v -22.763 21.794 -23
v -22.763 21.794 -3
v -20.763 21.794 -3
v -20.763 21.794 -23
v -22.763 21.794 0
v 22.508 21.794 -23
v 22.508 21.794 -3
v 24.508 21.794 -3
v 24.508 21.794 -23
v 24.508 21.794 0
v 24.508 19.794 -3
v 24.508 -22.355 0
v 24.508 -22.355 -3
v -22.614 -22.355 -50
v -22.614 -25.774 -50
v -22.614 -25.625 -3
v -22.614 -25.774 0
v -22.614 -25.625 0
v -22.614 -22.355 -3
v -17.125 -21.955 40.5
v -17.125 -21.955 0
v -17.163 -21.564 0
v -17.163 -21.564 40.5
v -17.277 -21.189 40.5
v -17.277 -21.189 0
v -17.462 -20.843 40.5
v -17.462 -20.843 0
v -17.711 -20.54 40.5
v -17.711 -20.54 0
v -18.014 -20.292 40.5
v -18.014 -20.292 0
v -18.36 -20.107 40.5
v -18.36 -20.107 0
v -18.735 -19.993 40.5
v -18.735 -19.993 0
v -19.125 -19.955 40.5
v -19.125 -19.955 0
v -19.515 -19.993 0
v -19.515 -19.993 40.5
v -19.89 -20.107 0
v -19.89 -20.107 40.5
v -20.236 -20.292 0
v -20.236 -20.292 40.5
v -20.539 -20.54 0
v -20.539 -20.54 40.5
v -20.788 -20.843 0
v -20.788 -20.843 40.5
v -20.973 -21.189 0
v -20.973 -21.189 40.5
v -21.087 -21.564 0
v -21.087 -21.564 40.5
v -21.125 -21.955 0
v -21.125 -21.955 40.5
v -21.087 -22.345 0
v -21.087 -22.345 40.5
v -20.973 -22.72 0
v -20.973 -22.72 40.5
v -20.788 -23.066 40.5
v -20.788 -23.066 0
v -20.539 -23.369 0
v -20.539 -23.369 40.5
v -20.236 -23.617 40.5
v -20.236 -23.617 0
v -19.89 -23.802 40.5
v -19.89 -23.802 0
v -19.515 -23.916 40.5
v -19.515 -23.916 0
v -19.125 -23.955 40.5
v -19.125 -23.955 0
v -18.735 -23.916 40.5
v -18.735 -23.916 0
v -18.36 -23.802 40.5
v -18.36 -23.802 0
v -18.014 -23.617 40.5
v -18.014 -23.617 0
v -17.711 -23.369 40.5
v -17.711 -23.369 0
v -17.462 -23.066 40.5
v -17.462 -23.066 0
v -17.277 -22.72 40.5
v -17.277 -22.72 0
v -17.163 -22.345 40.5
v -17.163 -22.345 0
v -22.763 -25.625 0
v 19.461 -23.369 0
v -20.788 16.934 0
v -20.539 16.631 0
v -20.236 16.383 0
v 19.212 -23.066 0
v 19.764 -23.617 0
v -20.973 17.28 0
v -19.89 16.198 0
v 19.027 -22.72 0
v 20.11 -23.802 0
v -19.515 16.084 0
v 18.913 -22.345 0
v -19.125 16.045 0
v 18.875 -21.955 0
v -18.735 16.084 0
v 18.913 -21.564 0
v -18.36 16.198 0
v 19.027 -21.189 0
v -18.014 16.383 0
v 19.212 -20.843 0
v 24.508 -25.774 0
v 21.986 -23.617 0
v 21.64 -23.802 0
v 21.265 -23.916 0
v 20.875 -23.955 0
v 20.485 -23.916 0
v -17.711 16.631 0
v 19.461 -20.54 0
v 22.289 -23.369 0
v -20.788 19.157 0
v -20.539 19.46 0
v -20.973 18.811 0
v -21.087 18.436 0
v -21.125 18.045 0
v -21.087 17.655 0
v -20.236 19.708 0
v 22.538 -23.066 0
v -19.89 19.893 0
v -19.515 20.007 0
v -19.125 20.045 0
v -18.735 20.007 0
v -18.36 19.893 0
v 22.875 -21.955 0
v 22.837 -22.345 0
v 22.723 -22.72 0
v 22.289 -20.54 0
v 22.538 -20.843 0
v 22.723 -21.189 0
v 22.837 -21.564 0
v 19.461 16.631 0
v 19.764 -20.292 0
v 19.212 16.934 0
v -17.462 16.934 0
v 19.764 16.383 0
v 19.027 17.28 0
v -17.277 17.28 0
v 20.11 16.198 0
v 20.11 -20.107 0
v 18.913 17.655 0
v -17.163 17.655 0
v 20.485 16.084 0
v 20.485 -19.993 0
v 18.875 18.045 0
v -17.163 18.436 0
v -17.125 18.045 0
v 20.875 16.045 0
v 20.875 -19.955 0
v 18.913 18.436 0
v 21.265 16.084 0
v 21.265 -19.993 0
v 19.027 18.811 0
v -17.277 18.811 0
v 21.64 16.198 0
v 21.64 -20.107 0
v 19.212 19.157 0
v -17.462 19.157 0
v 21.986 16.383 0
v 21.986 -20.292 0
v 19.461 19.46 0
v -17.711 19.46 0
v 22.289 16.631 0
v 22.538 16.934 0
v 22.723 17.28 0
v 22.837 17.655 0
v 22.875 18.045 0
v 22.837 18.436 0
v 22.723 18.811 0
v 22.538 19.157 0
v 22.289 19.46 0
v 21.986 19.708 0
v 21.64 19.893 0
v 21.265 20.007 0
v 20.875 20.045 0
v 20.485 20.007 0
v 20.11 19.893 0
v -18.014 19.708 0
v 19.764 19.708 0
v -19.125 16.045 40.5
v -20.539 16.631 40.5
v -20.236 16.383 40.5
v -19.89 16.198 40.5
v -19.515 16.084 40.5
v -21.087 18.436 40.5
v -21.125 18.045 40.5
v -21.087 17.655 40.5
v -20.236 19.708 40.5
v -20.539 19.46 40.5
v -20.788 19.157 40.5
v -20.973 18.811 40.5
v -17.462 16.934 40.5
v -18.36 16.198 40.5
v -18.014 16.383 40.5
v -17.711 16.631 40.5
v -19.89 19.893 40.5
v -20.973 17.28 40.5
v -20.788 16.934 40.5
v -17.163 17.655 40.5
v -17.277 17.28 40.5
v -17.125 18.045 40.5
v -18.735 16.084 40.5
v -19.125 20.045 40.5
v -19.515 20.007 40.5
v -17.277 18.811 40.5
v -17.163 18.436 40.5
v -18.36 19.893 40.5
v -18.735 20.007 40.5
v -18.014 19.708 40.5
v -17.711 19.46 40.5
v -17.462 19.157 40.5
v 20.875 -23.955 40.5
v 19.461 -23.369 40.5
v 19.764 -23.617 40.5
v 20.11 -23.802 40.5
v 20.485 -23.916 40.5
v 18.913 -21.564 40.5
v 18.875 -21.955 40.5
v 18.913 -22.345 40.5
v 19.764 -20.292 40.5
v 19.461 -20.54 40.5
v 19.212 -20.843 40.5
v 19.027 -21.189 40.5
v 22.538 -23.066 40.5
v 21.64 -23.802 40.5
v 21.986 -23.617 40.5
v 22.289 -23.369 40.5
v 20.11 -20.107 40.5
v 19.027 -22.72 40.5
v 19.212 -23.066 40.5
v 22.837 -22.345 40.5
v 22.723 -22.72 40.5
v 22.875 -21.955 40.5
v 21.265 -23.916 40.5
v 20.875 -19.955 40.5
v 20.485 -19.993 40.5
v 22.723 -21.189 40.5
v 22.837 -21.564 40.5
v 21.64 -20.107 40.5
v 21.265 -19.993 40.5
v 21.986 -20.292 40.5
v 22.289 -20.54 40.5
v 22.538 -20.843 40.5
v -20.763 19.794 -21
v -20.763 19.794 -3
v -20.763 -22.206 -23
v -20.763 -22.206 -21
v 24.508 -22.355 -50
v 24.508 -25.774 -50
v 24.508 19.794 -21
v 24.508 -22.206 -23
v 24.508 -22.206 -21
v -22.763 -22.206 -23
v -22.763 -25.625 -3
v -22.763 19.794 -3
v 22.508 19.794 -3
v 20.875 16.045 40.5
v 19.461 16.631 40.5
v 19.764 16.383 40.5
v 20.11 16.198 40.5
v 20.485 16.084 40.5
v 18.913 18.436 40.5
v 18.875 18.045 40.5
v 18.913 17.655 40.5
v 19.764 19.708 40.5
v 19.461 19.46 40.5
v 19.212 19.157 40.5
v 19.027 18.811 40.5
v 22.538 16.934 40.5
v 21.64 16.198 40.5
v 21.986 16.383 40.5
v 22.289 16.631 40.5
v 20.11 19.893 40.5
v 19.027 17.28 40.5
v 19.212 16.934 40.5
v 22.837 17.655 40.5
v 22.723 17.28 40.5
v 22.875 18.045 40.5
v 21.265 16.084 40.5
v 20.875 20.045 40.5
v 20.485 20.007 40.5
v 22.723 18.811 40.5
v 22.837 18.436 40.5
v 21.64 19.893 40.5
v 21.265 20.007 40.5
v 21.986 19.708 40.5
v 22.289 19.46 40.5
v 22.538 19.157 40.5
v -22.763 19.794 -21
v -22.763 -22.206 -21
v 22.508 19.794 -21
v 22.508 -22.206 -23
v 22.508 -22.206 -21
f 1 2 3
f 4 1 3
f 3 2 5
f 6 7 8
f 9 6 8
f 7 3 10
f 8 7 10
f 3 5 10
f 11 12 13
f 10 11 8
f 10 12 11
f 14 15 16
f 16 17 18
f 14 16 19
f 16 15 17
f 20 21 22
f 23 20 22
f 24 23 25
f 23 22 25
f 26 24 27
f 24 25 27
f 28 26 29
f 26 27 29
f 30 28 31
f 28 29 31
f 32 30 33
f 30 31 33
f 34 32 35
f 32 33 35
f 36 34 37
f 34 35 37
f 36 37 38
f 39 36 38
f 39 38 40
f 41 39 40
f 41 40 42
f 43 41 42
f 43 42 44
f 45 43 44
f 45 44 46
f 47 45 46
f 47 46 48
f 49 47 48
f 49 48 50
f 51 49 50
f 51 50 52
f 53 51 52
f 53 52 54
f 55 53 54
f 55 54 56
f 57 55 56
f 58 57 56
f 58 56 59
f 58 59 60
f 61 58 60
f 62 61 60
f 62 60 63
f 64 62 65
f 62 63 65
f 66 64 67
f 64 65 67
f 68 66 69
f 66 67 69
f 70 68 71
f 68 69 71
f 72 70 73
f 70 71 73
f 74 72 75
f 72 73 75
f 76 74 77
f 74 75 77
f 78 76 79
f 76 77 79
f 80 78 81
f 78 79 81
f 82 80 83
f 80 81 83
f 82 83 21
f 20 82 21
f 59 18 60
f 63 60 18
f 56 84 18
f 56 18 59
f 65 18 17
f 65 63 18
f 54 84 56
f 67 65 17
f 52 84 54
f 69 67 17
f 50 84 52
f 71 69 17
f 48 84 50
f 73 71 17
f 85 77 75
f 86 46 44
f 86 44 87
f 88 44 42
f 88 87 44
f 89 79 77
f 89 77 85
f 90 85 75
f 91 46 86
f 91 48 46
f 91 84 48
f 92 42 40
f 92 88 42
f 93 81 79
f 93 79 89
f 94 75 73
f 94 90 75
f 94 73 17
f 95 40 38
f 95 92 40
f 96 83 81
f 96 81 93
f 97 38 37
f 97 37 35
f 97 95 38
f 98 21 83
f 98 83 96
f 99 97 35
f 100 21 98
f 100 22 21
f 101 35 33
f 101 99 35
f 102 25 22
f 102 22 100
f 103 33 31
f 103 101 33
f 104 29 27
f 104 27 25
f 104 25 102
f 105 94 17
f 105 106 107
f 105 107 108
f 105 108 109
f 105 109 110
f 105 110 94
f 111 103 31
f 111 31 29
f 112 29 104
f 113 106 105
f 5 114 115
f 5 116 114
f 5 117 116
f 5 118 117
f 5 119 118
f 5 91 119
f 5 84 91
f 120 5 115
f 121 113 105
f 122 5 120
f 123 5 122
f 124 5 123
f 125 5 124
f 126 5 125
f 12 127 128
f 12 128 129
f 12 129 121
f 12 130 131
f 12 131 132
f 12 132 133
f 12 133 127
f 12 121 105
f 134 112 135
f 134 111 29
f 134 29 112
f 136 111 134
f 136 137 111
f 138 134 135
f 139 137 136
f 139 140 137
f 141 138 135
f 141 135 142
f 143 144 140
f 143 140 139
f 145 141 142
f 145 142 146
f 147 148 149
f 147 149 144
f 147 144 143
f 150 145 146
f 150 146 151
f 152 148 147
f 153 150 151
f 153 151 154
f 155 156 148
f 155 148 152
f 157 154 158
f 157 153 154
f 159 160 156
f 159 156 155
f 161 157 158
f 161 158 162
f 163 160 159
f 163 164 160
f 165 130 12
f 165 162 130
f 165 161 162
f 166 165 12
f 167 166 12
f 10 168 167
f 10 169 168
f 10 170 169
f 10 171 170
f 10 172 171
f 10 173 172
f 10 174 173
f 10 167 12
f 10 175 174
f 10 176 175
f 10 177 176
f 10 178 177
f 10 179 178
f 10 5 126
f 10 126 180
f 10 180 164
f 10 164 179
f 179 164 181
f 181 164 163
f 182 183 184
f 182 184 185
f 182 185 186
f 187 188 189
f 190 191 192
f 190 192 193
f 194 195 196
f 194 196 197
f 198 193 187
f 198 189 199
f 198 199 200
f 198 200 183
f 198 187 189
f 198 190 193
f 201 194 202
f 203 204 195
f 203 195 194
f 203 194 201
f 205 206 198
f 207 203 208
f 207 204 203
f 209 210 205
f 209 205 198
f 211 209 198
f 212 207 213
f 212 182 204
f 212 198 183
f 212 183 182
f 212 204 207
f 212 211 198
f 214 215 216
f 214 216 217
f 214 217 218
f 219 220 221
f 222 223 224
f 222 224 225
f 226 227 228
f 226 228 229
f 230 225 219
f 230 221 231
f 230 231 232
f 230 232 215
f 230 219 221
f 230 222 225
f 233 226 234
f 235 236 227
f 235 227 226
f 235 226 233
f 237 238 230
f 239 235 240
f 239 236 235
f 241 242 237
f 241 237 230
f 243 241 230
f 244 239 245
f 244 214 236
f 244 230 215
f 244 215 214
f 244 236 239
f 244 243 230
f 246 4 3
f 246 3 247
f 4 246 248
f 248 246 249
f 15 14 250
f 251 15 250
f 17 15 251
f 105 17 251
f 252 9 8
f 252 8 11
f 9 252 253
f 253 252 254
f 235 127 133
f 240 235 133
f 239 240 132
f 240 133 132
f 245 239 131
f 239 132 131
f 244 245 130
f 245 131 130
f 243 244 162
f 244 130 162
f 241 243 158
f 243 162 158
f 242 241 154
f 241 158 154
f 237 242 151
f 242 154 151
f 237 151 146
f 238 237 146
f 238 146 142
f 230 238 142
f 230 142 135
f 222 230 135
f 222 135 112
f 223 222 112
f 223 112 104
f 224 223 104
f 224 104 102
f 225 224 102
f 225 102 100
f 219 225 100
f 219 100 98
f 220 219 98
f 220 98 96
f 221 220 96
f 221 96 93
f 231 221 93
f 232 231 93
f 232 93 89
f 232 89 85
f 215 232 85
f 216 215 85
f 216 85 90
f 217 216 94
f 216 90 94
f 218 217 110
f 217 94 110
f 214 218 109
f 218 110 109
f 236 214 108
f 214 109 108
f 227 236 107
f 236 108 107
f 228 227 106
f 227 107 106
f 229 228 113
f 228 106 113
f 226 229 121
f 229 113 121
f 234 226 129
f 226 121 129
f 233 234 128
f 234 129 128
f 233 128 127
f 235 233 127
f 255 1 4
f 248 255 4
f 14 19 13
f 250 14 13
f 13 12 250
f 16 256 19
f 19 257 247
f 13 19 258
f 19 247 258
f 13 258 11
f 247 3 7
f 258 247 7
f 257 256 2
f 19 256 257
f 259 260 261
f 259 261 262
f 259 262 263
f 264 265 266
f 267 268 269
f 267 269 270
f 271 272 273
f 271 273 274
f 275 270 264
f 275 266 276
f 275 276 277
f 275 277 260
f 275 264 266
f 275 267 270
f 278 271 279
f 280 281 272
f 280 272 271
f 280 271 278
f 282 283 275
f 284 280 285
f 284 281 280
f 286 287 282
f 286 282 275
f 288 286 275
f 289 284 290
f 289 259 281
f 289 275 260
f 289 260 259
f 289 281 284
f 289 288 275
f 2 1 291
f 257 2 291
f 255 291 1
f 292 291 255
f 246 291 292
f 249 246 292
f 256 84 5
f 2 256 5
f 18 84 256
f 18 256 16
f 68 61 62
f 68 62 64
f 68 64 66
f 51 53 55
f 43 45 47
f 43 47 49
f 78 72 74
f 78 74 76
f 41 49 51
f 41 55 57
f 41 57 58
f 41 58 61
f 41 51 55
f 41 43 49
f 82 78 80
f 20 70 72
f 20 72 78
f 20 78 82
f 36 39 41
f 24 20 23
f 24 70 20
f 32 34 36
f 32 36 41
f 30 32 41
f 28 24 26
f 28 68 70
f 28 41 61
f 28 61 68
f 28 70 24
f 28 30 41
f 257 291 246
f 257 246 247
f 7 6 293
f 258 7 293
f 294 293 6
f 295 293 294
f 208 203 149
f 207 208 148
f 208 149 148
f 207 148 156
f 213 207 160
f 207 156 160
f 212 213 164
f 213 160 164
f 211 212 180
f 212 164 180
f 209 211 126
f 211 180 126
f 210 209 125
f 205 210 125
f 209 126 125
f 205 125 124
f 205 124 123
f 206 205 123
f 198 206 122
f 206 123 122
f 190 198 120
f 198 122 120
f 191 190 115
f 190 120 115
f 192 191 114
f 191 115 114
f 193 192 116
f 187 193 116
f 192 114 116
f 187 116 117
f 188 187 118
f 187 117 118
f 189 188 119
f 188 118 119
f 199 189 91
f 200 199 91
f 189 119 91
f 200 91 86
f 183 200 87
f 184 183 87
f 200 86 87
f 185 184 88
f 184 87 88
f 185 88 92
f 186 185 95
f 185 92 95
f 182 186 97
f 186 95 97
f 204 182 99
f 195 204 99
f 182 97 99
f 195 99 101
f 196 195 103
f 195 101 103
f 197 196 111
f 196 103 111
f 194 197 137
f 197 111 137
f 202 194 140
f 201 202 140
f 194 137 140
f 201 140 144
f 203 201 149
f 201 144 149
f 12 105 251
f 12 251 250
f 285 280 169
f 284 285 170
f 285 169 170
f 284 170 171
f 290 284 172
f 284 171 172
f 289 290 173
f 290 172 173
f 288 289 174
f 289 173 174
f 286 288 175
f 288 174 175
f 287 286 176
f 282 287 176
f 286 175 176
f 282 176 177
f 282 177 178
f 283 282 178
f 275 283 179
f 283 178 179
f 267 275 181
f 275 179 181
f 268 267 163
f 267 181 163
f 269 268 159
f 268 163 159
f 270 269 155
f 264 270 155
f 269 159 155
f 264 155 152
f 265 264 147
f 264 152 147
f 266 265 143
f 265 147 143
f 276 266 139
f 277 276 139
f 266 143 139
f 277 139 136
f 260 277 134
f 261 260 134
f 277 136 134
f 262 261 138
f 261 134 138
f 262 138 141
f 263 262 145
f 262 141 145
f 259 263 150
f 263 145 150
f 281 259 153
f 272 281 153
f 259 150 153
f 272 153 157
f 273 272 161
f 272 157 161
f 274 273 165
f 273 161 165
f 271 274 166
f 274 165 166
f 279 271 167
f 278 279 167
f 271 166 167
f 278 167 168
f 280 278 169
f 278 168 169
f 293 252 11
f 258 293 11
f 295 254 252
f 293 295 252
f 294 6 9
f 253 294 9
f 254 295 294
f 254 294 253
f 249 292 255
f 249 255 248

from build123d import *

# Parameters (mm, degrees)
F0_R      = 2
F1_DEPTH  = 40.5
F2_W      = 47.270983
F2_H      = 47.419636
F3_DEPTH  = 3
F4_W      = 47.122335
F4_H      = 3.418969
F5_DEPTH  = 50
F6_W      = 2
F6_H      = 44
F7_DEPTH  = 20
F8_W      = 2
F8_H      = 44
F9_DEPTH  = 20
F10_W     = 42
F10_H     = 18
F11_DEPTH = 25
F12_W     = 42
F12_H     = 18
F13_DEPTH = 25


with BuildPart() as f1:
    # F0 (on Top) → F1 (new body)
    with BuildSketch(Plane.XY):
        with Locations((-19.125001, -21.954547)):
            Circle(F0_R)
        with Locations((20.874999, 18.045453)):
            Circle(F0_R)
        with Locations((20.874999, -21.954547)):
            Circle(F0_R)
        with Locations((-19.125001, 18.045453)):
            Circle(F0_R)
    extrude(amount=F1_DEPTH)

    # F2 (on Top) → F3 (join)
    with BuildSketch(Plane.XY):
        with Locations((0.872621, -1.915443)):
            Rectangle(F2_W, F2_H)
    extrude(amount=-F3_DEPTH)

    # F4 (on Top) → F5 (join)
    with BuildSketch(Plane.XY):
        with Locations((0.946948, -24.064426)):
            Rectangle(F4_W, F4_H)
    extrude(amount=-F5_DEPTH)

    # F6 (on face) → F7 (join)
    with BuildSketch(Plane(origin=(0, 0, -3), x_dir=(1, 0, 0), z_dir=(0, 0, -1))):
        with Locations((23.508113, 0.205625)):
            Rectangle(F6_W, F6_H)
    extrude(amount=F7_DEPTH)

    # F8 (on face) → F9 (join)
    with BuildSketch(Plane(origin=(0, 0, -3), x_dir=(1, 0, 0), z_dir=(0, 0, -1))):
        with Locations((-21.76287, 0.205625)):
            Rectangle(F8_W, F8_H)
    extrude(amount=F9_DEPTH)

    # F10 (on face) → F11 (cut)
    with BuildSketch(Plane.YZ.offset(24.508113)):
        with Locations((-1.205625, -12)):
            Rectangle(F10_W, F10_H)
    extrude(amount=-F11_DEPTH, mode=Mode.SUBTRACT)

    # F12 (on face) → F13 (cut)
    with BuildSketch(Plane(origin=(-22.76287, 0, 0), x_dir=(0, -1, 0), z_dir=(-1, 0, 0))):
        with Locations((1.205625, -12)):
            Rectangle(F12_W, F12_H)
    extrude(amount=-F13_DEPTH, mode=Mode.SUBTRACT)


solid = f1.part
